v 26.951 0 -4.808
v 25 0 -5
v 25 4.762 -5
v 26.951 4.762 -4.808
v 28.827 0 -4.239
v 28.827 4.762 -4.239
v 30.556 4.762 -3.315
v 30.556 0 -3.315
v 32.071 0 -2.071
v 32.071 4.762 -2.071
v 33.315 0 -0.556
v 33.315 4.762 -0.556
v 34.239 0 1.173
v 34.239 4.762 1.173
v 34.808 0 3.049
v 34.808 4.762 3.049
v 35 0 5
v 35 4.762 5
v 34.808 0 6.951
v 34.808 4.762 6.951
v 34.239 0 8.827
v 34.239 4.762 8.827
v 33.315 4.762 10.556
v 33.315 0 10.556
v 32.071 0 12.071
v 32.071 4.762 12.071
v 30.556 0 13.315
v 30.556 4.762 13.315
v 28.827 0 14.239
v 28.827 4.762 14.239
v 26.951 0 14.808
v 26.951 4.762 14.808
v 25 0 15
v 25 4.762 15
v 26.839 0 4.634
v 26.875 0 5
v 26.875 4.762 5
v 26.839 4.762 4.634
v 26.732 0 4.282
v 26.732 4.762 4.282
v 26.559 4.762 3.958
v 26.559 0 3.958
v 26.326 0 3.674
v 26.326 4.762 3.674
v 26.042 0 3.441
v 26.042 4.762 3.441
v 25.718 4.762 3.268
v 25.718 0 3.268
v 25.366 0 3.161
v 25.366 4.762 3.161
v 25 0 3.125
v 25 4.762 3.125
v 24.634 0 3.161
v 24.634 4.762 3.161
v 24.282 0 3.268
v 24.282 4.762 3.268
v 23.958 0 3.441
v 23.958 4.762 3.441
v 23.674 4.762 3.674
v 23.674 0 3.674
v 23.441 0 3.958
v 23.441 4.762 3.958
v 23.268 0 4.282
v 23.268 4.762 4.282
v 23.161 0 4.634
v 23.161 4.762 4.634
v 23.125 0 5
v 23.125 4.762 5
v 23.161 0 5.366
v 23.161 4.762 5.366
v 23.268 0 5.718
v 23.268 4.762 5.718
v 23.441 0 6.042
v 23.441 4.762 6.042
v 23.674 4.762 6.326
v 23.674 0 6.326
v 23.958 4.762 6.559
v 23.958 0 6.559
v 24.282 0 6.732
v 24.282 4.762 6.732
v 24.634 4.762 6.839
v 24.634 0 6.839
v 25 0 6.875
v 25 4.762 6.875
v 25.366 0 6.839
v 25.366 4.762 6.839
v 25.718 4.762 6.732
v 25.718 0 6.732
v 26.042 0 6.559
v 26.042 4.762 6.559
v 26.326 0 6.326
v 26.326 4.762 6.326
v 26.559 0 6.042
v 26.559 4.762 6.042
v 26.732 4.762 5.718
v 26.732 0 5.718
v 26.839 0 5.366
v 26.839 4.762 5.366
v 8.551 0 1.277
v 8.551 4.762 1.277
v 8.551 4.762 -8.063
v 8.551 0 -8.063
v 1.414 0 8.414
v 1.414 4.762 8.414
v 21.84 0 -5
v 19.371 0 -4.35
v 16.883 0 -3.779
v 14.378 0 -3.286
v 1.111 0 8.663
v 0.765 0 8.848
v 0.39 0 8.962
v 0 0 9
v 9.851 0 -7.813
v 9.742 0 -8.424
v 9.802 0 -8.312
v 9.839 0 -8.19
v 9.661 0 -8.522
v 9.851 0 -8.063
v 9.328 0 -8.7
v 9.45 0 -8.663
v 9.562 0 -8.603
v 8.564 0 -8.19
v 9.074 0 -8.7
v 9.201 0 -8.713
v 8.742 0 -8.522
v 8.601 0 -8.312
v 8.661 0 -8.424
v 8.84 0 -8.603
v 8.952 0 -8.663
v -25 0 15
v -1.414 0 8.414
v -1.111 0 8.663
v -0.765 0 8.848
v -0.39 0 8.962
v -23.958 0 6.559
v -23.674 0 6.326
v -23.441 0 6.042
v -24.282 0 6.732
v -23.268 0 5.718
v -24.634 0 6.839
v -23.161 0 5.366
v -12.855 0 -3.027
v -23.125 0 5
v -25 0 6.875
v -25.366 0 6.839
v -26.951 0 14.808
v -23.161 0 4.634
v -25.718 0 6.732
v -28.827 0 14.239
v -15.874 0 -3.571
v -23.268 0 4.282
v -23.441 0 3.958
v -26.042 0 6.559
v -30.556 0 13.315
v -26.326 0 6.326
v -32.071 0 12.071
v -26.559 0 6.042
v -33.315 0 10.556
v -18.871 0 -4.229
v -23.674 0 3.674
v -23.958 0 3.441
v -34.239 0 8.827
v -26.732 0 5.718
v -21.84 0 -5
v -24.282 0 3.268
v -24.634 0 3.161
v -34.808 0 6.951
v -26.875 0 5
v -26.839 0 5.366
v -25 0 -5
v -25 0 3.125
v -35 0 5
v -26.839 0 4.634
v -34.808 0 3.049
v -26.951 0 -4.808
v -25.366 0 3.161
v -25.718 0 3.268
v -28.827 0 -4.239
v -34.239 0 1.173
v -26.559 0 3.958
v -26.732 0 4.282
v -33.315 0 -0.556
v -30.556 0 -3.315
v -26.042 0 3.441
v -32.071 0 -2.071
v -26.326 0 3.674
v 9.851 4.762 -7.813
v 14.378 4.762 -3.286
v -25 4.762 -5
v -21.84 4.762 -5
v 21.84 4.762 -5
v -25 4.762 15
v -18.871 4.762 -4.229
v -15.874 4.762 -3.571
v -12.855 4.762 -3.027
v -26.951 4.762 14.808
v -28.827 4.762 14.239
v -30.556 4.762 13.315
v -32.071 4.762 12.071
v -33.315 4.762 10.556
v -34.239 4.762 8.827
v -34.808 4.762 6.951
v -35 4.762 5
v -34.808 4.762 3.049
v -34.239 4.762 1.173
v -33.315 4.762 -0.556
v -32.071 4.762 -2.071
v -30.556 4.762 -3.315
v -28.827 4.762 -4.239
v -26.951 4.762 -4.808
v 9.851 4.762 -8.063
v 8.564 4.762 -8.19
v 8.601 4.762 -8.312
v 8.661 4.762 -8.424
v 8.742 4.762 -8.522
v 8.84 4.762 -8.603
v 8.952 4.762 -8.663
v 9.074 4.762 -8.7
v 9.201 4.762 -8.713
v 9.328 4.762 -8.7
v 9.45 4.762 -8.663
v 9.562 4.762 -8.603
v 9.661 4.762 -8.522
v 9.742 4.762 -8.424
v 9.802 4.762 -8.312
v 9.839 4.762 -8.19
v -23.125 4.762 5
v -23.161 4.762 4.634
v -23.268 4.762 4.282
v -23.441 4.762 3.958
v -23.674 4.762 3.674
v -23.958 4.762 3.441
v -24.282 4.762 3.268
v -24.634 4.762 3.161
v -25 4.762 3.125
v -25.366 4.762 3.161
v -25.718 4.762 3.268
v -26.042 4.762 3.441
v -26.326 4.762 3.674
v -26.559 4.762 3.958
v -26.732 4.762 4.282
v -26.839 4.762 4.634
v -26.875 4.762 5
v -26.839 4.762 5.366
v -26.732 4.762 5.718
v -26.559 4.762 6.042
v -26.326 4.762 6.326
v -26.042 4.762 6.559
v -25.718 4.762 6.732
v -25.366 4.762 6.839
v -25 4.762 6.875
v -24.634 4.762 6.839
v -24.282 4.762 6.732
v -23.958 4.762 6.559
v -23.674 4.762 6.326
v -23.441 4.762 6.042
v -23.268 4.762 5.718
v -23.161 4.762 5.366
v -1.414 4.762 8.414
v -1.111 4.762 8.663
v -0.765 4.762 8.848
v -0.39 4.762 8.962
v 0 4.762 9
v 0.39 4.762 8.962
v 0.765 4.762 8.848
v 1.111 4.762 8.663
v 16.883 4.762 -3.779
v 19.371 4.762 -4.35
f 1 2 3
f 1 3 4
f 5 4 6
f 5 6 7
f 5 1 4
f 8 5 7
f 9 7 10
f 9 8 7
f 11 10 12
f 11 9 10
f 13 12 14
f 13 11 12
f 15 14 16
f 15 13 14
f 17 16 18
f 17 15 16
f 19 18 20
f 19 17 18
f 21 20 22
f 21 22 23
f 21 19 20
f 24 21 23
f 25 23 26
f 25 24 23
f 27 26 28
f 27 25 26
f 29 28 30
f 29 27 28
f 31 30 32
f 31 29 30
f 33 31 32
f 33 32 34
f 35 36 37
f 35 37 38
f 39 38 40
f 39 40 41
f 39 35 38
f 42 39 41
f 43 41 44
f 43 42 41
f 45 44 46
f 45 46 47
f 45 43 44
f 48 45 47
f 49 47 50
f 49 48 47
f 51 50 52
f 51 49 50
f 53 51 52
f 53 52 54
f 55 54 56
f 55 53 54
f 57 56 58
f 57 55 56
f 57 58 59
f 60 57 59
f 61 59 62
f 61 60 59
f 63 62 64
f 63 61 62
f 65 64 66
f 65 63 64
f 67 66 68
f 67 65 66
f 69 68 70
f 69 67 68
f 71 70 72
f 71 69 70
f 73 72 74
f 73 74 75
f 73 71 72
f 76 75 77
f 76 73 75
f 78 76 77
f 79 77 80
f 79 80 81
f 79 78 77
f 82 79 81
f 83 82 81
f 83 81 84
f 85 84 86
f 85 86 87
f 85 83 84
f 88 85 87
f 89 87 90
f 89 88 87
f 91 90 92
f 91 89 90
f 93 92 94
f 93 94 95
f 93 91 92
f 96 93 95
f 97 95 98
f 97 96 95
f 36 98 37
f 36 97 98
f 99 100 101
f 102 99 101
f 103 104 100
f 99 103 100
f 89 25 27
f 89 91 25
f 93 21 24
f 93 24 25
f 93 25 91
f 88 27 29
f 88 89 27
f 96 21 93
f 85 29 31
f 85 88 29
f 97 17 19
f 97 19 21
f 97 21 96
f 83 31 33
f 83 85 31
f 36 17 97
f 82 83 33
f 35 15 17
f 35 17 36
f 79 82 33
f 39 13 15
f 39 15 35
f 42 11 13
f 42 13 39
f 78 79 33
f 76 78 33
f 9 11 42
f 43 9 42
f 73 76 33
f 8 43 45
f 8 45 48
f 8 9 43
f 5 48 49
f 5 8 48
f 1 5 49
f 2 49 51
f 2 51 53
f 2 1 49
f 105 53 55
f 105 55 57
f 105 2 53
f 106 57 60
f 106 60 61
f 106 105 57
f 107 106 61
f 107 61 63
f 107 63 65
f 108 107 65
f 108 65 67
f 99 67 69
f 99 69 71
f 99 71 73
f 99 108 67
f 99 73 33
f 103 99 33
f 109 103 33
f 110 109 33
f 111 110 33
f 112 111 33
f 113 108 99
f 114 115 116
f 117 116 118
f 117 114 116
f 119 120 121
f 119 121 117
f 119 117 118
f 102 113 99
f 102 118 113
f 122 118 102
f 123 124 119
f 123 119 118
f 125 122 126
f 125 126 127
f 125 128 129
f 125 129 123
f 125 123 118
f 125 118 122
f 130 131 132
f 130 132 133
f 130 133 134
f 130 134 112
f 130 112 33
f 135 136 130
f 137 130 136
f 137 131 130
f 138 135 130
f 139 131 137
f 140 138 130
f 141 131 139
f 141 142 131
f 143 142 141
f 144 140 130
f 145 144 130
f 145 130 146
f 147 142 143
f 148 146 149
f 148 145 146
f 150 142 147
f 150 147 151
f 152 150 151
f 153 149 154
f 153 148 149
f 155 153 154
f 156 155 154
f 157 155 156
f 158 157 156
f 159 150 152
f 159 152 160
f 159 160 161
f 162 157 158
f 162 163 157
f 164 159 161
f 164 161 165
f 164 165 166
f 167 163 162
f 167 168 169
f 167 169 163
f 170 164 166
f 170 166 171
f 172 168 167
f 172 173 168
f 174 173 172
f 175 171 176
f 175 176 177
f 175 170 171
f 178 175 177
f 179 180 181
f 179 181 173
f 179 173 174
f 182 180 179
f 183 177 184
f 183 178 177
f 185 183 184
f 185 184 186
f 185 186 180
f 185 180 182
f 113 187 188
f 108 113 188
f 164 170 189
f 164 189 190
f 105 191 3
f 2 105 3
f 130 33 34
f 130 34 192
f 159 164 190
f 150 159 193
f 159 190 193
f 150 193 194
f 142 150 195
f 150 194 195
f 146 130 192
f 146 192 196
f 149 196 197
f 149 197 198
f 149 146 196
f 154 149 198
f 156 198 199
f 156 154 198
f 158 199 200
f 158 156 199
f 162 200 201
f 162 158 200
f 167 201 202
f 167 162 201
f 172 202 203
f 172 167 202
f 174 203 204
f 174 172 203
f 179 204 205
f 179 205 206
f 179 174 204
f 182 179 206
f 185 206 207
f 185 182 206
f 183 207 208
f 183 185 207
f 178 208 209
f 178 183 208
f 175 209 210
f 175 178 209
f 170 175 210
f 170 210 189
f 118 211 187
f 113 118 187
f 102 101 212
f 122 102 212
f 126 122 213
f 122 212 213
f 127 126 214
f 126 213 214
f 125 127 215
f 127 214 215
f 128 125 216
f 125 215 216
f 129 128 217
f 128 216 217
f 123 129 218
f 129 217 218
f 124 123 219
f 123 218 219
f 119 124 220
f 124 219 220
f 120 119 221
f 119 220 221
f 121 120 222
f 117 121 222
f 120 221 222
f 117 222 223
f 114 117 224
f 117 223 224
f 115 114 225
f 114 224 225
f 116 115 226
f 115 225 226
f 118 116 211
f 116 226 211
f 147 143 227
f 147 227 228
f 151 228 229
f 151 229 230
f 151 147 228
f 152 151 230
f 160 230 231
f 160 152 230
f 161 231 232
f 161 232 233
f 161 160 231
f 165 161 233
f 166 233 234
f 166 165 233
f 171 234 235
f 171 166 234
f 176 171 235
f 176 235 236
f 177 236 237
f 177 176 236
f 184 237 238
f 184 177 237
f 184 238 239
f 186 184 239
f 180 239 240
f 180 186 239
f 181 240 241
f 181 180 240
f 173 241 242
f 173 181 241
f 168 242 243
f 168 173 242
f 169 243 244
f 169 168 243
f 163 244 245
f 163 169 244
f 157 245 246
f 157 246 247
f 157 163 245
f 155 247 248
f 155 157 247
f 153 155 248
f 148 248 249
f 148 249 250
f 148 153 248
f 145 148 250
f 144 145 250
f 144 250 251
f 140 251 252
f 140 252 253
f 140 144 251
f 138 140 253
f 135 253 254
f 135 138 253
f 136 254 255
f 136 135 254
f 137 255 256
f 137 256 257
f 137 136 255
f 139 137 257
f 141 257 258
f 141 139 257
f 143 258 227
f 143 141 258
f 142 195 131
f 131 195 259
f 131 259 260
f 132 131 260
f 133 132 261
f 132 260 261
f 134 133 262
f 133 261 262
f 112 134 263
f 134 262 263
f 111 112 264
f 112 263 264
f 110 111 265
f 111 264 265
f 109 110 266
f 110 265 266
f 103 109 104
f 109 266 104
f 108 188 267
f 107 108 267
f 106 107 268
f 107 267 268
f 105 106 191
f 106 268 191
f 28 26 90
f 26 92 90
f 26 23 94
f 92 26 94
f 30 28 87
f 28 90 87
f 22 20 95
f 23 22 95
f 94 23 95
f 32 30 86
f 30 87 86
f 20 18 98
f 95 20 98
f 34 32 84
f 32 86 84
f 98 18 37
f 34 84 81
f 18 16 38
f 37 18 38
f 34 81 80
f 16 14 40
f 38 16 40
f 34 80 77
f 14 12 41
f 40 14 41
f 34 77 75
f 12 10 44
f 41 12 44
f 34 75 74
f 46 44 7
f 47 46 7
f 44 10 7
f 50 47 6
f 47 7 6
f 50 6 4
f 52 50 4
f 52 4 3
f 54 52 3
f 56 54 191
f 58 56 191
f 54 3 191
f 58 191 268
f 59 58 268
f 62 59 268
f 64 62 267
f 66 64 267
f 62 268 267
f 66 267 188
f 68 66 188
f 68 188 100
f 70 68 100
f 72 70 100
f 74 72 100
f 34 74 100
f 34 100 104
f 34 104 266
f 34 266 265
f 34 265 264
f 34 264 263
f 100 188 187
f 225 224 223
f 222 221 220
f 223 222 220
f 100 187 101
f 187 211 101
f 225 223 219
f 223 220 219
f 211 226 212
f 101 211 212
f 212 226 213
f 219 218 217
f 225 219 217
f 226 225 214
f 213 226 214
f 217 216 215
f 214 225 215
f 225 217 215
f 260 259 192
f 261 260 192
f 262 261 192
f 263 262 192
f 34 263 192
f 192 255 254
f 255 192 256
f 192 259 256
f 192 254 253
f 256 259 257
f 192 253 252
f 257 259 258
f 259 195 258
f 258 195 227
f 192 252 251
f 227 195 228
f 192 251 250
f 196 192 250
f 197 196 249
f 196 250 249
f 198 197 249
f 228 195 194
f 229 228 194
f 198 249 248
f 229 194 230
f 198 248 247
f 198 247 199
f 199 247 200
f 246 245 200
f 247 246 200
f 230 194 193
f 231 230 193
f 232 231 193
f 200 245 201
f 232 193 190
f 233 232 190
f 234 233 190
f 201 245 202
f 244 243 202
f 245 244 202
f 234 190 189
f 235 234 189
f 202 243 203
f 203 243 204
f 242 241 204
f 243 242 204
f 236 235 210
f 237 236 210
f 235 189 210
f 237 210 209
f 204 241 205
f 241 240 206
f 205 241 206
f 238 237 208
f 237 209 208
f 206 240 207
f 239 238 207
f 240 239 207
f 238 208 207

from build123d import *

# Parameters (mm, degrees)
SKETCH1_R           = 1.875
BOSS_EXTRUDE1_DEPTH = 4.7625
CUT_EXTRUDE1_DEPTH  = 5.7625
BOSS_EXTRUDE2_DEPTH = 4.7625


with BuildPart() as part:
    # Sketch1 → Boss-Extrude1 (new body)
    with BuildSketch(Plane(origin=(0, 0, 0), x_dir=(1, 0, 0), z_dir=(0, 1, 0))):
        with BuildLine():
            Line((-25, 5), (25, 5))
            ThreePointArc((25, 5), (35, -5), (25, -15))
            Line((25, -15), (-25, -15))
            ThreePointArc((-25, -15), (-35, -5), (-25, 5))
        make_face()
        with Locations((-25, -5)):
            Circle(SKETCH1_R, mode=Mode.SUBTRACT)
        with Locations((25, -5)):
            Circle(SKETCH1_R, mode=Mode.SUBTRACT)
    extrude(amount=BOSS_EXTRUDE1_DEPTH)

    # Sketch3 → Cut-Extrude1 (cut, through all)
    with BuildSketch(Plane(origin=(0, 4.7625, 0), x_dir=(1, 0, 0), z_dir=(0, 1, 0))):
        with BuildLine():
            Line((-12.855000529, 3.026573405), (-1.414213562, -8.414213562))
            ThreePointArc((-1.414213562, -8.414213562), (0, -9), (1.414213562, -8.414213562))
            Line((1.414213562, -8.414213562), (12.855000529, 3.026573405))
            ThreePointArc((12.855000529, 3.026573405), (0, 164), (-12.855000529, 3.026573405))
        make_face()
    extrude(amount=-CUT_EXTRUDE1_DEPTH, mode=Mode.SUBTRACT)

    # Sketch4 → Boss-Extrude2 (add)
    with BuildSketch(Plane(origin=(0, 4.7625, 0), x_dir=(1, 0, 0), z_dir=(0, 1, 0))):
        with BuildLine():
            Line((14.377657426, 3.286243553), (8.551135427, -1.277291698))
            Line((8.551135427, -1.277291698), (8.551135427, 8.062765551))
            ThreePointArc((8.551135427, 8.062765551), (9.201135427, 8.712765551), (9.851135427, 8.062765551))
            Line((9.851135427, 8.062765551), (9.851135427, 7.812765551))
            Line((9.851135427, 7.812765551), (14.377657426, 3.286243553))
        make_face()
    extrude(amount=-BOSS_EXTRUDE2_DEPTH)


solid = part.part
